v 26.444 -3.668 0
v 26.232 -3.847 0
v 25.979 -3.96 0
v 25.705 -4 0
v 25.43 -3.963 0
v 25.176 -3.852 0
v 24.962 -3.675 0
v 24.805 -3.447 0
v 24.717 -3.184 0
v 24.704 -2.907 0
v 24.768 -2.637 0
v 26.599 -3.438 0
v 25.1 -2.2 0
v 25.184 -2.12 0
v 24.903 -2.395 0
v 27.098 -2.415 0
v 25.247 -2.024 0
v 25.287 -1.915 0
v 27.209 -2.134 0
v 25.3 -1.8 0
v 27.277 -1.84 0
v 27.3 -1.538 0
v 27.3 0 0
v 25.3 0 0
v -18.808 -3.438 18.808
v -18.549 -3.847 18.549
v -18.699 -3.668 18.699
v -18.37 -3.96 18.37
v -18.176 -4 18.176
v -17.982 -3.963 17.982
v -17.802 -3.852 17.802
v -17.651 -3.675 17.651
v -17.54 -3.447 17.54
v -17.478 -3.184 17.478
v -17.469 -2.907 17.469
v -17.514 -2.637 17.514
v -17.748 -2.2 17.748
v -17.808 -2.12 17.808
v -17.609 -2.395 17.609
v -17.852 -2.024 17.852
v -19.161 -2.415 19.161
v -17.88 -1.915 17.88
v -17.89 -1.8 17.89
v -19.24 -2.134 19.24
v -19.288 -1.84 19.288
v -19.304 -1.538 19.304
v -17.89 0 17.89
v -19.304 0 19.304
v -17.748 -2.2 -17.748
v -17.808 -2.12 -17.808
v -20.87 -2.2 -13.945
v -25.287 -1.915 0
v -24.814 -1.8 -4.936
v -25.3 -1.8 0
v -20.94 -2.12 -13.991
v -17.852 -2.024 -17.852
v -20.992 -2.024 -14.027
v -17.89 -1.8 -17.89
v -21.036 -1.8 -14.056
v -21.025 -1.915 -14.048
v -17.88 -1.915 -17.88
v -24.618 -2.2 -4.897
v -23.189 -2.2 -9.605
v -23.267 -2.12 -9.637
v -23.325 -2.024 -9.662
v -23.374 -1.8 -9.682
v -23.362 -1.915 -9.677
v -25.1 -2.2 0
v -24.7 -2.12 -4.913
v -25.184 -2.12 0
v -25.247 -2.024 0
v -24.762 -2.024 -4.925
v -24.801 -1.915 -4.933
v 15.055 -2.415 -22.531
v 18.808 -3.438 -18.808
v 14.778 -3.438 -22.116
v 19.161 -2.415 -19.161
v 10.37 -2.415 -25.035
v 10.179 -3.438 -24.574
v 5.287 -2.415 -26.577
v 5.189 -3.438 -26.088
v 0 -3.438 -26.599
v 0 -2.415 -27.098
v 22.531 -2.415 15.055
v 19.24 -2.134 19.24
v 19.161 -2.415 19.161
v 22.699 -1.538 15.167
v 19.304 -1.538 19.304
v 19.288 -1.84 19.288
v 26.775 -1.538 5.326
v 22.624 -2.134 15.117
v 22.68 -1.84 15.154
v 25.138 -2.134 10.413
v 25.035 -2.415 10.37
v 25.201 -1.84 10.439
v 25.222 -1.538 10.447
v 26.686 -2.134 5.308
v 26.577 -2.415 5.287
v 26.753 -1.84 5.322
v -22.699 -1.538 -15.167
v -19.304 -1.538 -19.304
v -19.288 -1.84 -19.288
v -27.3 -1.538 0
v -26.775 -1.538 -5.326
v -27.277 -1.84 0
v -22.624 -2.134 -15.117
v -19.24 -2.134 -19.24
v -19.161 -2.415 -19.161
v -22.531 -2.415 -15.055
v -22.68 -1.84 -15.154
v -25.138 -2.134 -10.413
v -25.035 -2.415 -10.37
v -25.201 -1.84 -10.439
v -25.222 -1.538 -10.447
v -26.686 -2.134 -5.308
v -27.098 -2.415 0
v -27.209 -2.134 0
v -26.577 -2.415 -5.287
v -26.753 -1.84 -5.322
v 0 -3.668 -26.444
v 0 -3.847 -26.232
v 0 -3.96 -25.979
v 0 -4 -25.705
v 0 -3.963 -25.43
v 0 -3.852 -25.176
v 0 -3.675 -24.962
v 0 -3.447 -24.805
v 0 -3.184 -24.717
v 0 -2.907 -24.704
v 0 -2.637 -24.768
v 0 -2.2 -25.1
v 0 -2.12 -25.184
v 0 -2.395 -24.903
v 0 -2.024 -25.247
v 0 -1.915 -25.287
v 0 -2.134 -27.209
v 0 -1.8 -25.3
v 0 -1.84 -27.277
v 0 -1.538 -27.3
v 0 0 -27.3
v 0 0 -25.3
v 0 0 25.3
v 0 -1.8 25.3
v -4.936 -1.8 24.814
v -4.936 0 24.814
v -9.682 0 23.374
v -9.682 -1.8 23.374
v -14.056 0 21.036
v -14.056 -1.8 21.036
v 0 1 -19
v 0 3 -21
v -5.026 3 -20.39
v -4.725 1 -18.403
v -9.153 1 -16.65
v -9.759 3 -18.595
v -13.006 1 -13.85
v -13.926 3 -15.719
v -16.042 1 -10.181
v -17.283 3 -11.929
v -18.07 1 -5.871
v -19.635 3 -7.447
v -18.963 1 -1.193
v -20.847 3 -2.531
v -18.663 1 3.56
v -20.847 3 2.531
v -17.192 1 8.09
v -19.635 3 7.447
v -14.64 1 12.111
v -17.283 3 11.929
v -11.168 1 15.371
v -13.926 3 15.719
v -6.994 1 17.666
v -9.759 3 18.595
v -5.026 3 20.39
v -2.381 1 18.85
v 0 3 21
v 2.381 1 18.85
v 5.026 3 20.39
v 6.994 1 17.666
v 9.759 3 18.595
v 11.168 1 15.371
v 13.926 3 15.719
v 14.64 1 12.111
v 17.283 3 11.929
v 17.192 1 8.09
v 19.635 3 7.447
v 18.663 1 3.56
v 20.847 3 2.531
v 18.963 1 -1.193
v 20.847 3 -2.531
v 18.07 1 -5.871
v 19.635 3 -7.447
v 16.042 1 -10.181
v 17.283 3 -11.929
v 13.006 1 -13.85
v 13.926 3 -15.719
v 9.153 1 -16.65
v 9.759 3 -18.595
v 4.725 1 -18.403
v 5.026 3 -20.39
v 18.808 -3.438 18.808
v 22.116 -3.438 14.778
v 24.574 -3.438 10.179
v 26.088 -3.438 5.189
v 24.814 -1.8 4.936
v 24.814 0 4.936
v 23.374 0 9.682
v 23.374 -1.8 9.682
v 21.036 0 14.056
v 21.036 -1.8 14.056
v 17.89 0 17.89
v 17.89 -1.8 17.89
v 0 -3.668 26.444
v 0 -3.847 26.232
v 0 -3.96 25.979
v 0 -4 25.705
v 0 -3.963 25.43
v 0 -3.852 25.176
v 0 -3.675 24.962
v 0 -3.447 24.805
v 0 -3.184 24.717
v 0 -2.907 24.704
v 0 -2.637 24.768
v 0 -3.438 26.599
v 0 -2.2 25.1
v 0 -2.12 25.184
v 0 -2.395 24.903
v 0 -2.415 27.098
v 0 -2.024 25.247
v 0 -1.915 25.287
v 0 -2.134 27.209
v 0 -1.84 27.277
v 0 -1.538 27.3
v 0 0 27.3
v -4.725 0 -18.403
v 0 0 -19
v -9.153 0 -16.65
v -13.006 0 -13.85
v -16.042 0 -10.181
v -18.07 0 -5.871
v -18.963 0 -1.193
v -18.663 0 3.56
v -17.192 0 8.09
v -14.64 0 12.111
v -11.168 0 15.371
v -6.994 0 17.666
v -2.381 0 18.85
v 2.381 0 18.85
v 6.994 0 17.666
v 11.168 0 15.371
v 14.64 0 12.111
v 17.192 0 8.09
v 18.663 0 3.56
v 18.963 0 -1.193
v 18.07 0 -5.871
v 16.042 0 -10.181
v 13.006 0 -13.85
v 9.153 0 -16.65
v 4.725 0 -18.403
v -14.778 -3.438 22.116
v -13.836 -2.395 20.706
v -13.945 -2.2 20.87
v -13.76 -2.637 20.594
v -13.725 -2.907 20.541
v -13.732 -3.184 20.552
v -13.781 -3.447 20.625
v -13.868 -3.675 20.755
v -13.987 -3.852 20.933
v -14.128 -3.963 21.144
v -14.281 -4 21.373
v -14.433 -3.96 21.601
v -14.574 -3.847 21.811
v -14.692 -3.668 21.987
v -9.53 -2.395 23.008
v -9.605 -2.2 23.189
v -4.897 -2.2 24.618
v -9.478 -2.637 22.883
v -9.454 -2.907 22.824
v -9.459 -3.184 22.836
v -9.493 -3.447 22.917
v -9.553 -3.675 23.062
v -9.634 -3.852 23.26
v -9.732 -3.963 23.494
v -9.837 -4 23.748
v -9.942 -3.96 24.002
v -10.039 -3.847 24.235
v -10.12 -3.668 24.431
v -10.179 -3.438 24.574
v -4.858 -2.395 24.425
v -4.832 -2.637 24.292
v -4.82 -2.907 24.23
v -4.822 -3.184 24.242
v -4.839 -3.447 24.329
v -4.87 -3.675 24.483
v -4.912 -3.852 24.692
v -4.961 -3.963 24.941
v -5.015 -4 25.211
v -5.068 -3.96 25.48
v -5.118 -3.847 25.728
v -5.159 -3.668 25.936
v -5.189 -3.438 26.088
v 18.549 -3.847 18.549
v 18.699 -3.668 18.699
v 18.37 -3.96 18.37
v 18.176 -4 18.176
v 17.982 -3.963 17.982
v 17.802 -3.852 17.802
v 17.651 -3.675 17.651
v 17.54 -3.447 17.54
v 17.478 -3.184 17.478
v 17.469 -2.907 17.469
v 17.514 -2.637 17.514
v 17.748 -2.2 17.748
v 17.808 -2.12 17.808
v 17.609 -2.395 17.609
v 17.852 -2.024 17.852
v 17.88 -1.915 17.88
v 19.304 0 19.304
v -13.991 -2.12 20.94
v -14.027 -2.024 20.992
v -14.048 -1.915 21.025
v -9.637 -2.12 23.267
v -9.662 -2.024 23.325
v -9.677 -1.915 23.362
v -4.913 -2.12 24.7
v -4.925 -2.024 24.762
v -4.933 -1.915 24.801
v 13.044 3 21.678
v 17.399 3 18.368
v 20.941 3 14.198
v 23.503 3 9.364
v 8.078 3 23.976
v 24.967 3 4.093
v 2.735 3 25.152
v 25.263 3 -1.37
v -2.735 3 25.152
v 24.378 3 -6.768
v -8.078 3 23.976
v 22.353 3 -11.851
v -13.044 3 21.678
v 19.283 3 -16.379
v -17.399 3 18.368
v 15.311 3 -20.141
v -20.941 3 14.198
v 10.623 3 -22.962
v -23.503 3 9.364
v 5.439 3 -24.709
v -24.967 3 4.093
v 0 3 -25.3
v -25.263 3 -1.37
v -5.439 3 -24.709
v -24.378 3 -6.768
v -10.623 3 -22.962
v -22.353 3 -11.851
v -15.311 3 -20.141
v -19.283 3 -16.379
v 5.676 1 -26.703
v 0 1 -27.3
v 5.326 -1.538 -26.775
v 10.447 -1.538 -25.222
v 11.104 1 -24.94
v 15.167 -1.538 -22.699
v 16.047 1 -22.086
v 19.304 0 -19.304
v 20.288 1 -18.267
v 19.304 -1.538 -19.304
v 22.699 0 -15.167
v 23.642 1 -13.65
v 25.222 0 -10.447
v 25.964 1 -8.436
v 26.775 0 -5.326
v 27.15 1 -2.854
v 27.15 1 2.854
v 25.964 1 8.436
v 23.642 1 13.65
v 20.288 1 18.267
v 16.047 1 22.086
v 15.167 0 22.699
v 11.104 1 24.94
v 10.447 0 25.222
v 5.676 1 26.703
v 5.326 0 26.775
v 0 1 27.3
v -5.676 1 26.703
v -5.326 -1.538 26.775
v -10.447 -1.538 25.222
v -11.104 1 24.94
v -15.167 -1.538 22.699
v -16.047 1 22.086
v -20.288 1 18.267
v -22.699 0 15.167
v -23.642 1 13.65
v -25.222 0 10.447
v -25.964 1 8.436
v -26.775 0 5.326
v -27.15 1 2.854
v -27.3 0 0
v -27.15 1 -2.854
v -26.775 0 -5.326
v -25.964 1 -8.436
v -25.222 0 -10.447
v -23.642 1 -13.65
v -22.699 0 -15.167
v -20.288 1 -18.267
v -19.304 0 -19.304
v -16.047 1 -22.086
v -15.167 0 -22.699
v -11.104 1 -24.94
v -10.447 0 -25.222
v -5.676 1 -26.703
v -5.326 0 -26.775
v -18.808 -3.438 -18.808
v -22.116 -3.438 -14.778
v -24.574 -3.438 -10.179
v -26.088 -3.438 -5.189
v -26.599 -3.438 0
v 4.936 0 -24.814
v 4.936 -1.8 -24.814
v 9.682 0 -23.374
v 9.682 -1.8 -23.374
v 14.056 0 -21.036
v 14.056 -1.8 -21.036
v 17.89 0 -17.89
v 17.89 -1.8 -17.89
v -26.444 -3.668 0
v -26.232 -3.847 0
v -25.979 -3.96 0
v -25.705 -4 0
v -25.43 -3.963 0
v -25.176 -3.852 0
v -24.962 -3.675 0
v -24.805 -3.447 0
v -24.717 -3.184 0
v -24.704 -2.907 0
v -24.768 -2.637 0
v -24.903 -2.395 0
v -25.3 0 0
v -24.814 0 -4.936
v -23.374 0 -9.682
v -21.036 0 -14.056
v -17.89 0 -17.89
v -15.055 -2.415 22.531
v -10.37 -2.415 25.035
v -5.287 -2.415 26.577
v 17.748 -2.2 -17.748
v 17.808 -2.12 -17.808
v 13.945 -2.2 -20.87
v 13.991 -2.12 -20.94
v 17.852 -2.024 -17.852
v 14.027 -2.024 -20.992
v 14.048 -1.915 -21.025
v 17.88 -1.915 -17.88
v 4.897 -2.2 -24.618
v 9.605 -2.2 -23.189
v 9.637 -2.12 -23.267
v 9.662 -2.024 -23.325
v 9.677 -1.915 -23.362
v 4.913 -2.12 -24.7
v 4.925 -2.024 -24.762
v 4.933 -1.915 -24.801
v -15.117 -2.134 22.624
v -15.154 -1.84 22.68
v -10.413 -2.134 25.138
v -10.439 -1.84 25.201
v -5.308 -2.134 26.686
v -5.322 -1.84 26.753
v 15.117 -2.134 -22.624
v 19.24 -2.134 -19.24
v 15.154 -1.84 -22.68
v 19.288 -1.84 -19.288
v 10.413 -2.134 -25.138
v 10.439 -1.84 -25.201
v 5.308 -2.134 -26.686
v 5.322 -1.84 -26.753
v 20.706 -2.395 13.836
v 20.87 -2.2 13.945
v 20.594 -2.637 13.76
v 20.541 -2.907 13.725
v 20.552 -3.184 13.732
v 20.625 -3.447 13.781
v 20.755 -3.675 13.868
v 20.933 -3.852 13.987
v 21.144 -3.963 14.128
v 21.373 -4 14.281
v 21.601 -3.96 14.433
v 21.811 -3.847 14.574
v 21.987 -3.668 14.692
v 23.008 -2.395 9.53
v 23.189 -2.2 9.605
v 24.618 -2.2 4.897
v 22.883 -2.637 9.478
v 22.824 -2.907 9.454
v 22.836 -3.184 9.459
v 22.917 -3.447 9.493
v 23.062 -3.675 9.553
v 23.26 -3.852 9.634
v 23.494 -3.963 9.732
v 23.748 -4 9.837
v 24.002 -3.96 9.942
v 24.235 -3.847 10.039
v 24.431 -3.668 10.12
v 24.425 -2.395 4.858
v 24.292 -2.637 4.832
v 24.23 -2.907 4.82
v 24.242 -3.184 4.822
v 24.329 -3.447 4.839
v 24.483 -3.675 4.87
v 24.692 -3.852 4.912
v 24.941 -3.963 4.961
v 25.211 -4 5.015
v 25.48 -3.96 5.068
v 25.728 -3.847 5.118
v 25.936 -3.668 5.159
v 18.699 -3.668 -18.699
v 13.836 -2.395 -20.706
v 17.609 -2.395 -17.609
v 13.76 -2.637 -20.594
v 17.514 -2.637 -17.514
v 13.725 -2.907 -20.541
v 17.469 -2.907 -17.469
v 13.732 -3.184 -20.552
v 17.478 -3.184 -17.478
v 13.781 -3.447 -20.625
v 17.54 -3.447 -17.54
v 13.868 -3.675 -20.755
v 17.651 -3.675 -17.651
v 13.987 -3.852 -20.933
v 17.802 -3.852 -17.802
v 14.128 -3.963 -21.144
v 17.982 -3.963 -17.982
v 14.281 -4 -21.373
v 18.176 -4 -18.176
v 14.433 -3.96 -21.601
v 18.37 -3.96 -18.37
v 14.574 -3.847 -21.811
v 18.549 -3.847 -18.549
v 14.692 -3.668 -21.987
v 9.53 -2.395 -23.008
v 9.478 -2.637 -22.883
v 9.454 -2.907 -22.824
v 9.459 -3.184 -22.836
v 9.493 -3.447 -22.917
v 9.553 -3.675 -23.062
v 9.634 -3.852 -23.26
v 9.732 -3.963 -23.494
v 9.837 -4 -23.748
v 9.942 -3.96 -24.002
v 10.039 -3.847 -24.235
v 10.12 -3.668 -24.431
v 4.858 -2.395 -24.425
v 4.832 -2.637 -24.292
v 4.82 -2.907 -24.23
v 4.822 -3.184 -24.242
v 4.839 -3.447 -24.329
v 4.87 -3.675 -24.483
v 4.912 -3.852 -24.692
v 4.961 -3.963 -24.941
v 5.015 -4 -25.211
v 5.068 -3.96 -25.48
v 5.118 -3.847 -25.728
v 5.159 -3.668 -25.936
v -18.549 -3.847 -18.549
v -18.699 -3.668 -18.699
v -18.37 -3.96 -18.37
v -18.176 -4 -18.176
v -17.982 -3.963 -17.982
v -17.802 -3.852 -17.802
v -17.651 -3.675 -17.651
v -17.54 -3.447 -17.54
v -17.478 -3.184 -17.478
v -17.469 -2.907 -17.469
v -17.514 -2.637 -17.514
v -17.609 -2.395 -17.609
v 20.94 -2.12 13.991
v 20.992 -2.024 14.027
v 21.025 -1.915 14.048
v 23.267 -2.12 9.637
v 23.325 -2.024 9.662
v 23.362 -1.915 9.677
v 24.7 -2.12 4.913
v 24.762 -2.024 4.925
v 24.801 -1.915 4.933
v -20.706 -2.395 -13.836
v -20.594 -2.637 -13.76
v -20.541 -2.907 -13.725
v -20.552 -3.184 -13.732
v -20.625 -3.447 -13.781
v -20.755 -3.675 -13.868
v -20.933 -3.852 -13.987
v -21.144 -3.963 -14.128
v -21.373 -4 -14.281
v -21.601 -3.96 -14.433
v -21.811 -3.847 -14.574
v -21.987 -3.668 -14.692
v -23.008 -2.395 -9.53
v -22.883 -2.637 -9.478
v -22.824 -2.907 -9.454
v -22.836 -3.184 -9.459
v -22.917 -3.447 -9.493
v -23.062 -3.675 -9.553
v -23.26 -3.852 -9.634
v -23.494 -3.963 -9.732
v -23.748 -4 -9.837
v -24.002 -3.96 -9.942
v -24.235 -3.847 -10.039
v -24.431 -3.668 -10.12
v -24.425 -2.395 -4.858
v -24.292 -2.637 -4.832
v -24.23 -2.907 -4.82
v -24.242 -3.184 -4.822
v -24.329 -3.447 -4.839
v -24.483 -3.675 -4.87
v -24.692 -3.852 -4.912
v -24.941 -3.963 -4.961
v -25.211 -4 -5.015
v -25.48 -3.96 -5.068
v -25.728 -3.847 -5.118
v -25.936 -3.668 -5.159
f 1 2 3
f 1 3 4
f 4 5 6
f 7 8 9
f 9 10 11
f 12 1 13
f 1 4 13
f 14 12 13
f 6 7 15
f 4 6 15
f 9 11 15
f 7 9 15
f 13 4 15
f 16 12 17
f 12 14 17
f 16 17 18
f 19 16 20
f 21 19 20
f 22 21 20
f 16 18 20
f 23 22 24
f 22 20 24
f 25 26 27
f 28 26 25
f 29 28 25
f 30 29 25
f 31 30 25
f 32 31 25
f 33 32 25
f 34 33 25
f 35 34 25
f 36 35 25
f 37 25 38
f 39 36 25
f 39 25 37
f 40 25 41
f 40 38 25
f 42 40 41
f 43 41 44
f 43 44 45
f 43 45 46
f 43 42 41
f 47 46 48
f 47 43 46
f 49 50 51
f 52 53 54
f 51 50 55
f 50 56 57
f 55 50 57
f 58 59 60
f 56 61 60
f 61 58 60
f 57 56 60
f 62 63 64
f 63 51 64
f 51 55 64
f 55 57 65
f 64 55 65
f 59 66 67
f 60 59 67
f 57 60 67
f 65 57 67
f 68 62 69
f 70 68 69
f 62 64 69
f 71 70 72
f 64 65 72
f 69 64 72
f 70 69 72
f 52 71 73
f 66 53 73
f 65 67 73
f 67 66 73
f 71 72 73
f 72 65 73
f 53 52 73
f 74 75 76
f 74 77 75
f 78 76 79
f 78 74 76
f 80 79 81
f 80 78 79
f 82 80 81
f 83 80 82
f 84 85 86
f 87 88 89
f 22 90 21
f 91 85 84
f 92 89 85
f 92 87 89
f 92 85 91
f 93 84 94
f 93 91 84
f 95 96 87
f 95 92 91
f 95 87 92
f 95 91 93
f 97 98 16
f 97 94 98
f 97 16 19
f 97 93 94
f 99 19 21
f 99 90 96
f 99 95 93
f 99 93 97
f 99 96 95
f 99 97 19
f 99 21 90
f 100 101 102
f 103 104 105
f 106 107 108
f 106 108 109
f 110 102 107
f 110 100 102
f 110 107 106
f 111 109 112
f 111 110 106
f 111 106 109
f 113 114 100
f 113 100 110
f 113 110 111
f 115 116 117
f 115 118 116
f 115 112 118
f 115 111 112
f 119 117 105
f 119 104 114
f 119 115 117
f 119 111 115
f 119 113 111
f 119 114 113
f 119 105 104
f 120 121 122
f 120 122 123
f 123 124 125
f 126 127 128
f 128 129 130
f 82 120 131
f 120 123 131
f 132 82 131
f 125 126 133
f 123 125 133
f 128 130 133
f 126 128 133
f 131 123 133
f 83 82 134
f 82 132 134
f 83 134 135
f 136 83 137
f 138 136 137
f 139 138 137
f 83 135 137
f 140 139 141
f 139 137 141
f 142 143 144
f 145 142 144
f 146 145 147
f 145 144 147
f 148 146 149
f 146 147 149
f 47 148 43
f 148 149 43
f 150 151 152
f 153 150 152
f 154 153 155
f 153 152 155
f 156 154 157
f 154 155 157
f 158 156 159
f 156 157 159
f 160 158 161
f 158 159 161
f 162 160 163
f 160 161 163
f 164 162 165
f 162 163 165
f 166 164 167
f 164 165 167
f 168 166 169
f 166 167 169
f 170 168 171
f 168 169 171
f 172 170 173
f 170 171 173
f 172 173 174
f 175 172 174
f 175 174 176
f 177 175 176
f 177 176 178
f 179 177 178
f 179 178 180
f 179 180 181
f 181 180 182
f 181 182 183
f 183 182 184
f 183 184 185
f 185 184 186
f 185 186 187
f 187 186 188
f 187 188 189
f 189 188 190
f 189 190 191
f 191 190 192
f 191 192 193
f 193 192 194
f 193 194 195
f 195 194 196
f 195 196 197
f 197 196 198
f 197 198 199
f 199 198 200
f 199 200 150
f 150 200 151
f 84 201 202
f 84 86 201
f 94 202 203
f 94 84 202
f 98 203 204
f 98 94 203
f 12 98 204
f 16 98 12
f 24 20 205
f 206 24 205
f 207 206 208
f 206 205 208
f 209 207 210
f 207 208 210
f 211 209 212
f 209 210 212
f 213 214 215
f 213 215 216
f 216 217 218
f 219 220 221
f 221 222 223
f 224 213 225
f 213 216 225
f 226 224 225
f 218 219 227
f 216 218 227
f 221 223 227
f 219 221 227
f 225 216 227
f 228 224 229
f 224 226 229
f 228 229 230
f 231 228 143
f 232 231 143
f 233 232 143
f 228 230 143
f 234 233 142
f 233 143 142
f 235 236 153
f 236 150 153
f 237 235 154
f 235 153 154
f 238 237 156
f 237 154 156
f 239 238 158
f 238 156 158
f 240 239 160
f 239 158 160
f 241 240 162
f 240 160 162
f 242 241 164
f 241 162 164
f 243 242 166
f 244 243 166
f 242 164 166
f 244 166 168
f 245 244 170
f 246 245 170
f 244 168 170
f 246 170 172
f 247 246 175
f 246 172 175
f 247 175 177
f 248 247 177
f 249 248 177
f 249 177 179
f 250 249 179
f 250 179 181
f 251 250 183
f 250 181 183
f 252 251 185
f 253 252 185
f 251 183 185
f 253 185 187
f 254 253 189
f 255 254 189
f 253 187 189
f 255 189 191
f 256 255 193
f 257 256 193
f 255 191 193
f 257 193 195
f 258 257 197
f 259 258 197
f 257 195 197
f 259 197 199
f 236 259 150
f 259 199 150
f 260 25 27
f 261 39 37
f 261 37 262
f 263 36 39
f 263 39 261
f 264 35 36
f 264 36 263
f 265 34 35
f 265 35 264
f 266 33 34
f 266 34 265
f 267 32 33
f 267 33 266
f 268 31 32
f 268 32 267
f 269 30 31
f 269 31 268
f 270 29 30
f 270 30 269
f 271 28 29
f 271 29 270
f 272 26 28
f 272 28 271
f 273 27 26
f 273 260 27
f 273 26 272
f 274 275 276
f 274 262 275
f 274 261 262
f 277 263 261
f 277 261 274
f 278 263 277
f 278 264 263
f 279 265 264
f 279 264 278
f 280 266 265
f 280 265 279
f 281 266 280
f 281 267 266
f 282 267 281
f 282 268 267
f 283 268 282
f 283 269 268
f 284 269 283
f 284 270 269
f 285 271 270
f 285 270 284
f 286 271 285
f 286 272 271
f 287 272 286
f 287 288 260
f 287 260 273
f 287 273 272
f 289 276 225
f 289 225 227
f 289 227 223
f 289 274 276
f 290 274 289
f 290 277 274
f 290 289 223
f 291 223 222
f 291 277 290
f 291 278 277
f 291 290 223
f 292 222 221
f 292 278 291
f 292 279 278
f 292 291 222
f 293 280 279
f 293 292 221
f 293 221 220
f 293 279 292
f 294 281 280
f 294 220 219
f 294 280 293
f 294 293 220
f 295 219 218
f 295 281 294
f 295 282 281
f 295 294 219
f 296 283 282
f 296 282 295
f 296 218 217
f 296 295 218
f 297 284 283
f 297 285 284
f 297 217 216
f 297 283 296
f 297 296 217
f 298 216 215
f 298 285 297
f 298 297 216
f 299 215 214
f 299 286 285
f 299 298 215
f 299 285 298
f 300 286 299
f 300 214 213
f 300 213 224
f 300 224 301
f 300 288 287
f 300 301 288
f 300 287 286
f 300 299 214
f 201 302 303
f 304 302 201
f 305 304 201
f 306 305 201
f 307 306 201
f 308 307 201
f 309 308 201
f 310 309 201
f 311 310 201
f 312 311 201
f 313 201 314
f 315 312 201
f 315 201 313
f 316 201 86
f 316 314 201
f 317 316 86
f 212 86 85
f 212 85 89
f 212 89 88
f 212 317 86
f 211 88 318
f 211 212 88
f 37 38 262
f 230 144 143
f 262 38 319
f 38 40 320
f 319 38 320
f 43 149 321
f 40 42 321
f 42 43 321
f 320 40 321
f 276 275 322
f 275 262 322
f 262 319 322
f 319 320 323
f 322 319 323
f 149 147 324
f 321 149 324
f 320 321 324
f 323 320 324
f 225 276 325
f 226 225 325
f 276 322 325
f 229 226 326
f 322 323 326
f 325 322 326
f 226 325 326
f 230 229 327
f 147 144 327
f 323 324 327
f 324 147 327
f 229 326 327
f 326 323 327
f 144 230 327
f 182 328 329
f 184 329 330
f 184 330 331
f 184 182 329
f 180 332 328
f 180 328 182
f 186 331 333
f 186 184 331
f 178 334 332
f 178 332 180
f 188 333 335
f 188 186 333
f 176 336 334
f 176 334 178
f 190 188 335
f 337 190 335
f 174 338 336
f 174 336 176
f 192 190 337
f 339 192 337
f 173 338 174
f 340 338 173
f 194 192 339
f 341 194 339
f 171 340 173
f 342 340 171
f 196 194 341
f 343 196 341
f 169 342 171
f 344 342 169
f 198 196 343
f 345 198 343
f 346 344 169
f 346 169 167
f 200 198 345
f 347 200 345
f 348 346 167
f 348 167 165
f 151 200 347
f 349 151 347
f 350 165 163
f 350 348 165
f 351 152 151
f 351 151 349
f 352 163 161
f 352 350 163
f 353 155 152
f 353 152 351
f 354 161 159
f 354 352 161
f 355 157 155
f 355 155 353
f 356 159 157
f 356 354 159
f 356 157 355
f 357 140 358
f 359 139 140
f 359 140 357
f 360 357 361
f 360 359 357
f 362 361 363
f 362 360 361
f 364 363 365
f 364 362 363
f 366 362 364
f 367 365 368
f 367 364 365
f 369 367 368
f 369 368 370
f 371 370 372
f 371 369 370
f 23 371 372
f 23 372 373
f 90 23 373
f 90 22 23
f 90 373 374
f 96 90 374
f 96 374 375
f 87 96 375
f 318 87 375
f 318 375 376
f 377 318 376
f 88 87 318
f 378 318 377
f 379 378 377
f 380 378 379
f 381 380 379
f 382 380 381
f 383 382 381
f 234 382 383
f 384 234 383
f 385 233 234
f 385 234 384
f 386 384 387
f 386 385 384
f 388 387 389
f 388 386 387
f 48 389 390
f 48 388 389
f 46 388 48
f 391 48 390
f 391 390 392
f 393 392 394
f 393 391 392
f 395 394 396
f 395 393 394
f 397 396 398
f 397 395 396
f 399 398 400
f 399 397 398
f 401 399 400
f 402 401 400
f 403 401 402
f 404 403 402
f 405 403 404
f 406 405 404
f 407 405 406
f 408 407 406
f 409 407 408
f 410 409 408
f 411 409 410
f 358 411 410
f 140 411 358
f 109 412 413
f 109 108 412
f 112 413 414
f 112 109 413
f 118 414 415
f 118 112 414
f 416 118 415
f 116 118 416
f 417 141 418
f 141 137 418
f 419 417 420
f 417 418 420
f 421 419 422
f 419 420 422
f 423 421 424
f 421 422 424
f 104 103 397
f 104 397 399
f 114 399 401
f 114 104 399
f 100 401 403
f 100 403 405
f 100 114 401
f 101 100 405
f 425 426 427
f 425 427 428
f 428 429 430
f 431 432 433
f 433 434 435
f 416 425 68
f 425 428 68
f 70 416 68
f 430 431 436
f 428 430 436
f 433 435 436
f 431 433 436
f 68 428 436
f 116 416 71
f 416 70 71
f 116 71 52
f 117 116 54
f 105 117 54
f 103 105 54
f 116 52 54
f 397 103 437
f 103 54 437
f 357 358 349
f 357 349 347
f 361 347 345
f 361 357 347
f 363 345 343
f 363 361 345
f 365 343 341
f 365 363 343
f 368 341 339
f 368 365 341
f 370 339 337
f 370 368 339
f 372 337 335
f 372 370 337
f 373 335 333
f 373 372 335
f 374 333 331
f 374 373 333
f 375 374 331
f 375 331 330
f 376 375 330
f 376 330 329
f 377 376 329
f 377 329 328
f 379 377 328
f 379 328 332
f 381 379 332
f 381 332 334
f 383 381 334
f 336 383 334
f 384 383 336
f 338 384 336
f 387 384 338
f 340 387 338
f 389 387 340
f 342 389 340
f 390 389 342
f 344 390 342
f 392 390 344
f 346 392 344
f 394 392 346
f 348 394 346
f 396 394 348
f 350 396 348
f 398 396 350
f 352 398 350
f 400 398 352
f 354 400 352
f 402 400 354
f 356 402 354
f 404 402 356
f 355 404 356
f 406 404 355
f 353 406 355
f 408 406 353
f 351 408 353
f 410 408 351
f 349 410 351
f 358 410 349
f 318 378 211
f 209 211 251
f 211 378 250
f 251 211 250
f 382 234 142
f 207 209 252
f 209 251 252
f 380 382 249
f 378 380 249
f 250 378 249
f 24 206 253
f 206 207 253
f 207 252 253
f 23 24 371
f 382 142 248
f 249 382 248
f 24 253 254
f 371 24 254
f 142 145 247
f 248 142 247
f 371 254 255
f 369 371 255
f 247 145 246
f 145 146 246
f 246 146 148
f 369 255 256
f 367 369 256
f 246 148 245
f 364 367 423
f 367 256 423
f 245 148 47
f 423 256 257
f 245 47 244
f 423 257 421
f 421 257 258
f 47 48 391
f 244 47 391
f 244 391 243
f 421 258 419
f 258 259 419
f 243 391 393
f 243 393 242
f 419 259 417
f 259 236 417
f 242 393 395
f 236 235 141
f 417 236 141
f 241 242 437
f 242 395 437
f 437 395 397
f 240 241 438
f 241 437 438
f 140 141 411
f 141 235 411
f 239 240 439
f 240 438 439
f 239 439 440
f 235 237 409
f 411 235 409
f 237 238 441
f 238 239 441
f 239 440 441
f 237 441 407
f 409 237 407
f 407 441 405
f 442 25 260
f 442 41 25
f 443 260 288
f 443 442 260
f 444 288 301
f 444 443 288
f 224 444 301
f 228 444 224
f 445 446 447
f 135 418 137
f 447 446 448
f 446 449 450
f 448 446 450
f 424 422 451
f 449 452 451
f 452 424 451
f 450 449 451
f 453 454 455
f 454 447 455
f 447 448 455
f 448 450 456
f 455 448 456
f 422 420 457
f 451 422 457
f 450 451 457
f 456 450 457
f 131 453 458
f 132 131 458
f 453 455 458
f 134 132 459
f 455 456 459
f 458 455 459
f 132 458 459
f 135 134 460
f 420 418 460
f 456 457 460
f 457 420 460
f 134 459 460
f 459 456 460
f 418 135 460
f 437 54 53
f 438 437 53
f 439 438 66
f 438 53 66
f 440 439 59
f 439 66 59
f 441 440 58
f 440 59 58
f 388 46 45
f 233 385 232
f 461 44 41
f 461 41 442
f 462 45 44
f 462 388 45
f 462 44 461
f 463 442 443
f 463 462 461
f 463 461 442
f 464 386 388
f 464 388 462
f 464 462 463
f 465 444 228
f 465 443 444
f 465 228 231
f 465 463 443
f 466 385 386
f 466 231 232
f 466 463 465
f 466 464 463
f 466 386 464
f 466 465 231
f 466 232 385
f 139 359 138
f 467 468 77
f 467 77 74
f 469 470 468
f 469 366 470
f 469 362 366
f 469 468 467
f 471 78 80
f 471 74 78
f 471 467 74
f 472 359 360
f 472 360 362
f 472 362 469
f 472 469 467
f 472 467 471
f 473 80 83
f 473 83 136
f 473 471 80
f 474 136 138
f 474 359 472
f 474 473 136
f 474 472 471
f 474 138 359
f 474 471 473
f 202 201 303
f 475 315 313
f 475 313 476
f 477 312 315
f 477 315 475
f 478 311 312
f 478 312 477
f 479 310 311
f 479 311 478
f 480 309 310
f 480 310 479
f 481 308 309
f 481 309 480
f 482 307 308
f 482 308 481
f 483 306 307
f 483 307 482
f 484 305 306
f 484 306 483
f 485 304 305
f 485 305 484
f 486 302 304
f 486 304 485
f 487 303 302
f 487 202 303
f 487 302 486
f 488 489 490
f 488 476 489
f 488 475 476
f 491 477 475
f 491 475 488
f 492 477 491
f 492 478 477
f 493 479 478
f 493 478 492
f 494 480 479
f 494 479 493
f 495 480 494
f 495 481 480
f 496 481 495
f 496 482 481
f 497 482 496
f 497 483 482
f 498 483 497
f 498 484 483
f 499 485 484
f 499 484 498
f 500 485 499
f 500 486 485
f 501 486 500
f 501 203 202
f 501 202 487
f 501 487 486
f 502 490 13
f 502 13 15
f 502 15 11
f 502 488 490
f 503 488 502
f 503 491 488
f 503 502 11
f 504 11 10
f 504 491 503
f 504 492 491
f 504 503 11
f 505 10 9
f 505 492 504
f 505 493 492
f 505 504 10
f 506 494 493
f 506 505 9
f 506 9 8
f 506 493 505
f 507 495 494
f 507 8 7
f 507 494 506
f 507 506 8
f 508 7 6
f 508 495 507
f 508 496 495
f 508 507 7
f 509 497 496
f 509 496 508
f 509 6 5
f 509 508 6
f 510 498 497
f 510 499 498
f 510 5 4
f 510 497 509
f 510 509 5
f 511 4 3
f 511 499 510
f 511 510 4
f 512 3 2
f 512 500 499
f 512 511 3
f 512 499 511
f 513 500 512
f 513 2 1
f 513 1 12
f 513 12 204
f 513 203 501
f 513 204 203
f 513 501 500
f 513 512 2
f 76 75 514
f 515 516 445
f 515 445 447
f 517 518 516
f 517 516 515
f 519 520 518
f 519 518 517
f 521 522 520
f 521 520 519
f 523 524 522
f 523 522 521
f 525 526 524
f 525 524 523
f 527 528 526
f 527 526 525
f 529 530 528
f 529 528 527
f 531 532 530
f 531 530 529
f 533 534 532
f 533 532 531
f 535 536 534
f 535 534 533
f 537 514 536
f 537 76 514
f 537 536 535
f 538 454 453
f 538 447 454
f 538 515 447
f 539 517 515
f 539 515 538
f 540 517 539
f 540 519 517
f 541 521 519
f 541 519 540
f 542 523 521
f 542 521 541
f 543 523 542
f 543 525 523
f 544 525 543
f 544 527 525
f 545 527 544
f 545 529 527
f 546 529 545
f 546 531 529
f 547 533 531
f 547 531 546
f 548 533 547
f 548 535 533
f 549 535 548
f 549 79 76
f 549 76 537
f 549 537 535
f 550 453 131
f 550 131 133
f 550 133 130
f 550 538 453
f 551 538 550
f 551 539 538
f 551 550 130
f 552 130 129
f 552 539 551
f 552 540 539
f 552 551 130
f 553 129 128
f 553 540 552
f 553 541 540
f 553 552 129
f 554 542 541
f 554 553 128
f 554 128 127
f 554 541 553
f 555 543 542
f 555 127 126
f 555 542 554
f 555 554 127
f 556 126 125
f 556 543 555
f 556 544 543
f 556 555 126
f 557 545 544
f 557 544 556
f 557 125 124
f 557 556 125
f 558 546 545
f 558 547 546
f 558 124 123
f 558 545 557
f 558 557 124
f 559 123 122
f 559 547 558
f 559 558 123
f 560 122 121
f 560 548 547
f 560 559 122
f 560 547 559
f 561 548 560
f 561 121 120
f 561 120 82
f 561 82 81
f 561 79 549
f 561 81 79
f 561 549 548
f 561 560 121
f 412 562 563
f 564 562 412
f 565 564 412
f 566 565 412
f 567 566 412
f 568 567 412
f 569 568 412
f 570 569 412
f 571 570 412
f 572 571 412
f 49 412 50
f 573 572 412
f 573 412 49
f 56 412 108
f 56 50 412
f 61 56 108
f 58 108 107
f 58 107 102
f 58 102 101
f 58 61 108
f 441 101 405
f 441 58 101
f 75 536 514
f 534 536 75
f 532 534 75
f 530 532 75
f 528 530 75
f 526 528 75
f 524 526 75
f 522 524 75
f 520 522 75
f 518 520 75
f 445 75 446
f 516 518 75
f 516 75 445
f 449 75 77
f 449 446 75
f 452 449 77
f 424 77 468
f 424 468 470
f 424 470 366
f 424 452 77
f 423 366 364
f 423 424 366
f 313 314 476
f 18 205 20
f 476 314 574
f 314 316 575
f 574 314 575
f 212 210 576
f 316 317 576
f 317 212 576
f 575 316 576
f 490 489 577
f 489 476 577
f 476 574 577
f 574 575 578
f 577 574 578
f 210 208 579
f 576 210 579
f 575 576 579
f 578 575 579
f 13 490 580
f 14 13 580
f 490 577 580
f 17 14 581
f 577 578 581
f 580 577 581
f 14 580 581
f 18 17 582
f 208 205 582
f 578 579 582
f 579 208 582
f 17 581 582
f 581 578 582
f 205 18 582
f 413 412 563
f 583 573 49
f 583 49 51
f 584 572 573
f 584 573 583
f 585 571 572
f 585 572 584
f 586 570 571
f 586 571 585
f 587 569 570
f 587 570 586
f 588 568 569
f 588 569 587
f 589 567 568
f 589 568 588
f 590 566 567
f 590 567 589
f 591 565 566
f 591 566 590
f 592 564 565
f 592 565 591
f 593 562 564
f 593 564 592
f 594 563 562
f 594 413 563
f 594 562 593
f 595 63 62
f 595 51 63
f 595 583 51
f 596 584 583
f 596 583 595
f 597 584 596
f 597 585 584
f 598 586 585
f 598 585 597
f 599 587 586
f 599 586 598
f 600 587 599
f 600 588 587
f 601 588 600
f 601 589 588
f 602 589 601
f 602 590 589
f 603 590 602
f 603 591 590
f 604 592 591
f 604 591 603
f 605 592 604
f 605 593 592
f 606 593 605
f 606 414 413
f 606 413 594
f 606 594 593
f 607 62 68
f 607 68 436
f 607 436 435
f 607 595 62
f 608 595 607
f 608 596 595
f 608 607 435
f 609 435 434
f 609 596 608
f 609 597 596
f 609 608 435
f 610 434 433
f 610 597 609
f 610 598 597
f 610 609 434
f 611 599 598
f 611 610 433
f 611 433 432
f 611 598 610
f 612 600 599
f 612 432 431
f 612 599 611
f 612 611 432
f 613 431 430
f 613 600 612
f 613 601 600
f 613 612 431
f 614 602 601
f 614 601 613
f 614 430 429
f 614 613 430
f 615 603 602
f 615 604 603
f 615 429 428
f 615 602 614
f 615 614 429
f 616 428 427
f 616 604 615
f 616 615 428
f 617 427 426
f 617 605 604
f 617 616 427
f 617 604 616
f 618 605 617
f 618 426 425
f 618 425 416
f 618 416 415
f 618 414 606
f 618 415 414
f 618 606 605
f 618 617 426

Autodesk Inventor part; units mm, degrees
ref_plane "YZ Plane" through (0, 0, 0) normal (1, 0, 0) x (0, 1, 0)
ref_plane "XZ Plane" through (0, 0, 0) normal (0, 1, 0) x (-1, 0, 0)
ref_plane "XY Plane" through (0, 0, 0) normal (0, 0, 1) x (1, 0, 0)
sketch "Эскиз1" plane through (0, 0, 0) normal (1, 0, 0) x (0, 1, 0)
  line L0 (0, 0) -> (10.522, 0) construction
  line L1 (0, 0) -> (0, -19) construction
  line L2 (0, 0) -> (0, -27.3) construction
  line L3 (0, -19) -> (3, -19)
  line L4 (3, -19) -> (3, -27.3)
  line L5 (3, -27.3) -> (0, -27.3)
  line L6 (0, -27.3) -> (0, -19)
  dimension "d0" = 19
  dimension "d1" = 27.3
  dimension "d2" = 3
revolve "Вращение1" add sketch "Эскиз1" angle 360 about axis through (0, 0, 0) along (0, 1, 0)
chamfer "Фаска1" distance 2 angle 45 1 edges at (0, 3, 19) measured on face at (2.1778, 3, -24.2689)
chamfer "Фаска2" distance 2 angle 45 1 edges at (0, 3, 27.3) measured on face at (3.853, 3, -24.7322)
sketch "Эскиз2" plane through (0, 0, 0) normal (1, 0, 0) x (0, 1, 0)
  line L0 (0, 0) -> (7.8289, 0) construction
  line L1 (0, 0) -> (0, -24.8) construction
  line L2 (0, 27.3) -> (0, -27.3) construction
  line L3 (0, -25.3) -> (-1.8, -25.3)
  line L4 (0, -27.3) -> (-1.5385, -27.3)
  line L5 (-2, -25.3) -> (-2, -26.7) construction
  line L6 (0, -25.3) -> (0, -27.3)
  line L7 (-2, 0.25) -> (-2, -25) construction
  line L8 (-2, -25) -> (-6, -25) construction
  arc A0 (-2.2, -25.1) -> (-3.4382, -26.5989) centre (-3, -25.7) ccw
  line L9 (-4, -25) -> (-4, 0) construction
  line L10 (-2, -24.7) -> (-4, -24.7) construction
  line L11 (-2, -25.3) -> (-2.0835, -25.3) construction
  arc A1 (-2, -25.7) -> (-2.0835, -25.3) centre (-3, -25.7) ccw construction
  arc A2 (-2.2, -25.1) -> (-1.8, -25.3) centre (-1.8, -24.8) ccw
  line L12 (-2.4149, -27.0978) -> (-3.4382, -26.5989)
  arc A3 (-3.4382, -26.5989) -> (-2, -25.7) centre (-3, -25.7) ccw construction
  arc A4 (-2.4149, -27.0978) -> (-1.5385, -27.3) centre (-1.5385, -25.3) ccw
  point P0 (-2.2859, -25)
  point P1 (-2, -27.3)
  dimension "d10" = 24.8
  dimension "d11" = 2
  dimension "d12" = 0.5
  dimension "d14" = 2
  dimension "d15" = 2
  dimension "d16" = 2
  dimension "d17" = 0.3
  dimension "d18" = 0.5
  dimension "d19" = 50
  dimension "d21" = 2
  dimension "d22" = 2
revolve "Вращение2" add sketch "Эскиз2" angle 45 about axis through (0, 0, 0) along (0, -1, 0)
pattern_circular "Круговой массив1" count 4 over 360 about axis through (0, 1.5, 0) along (0, -1, 0) of "Вращение2"
properties part number "mirror_lock_v2"
